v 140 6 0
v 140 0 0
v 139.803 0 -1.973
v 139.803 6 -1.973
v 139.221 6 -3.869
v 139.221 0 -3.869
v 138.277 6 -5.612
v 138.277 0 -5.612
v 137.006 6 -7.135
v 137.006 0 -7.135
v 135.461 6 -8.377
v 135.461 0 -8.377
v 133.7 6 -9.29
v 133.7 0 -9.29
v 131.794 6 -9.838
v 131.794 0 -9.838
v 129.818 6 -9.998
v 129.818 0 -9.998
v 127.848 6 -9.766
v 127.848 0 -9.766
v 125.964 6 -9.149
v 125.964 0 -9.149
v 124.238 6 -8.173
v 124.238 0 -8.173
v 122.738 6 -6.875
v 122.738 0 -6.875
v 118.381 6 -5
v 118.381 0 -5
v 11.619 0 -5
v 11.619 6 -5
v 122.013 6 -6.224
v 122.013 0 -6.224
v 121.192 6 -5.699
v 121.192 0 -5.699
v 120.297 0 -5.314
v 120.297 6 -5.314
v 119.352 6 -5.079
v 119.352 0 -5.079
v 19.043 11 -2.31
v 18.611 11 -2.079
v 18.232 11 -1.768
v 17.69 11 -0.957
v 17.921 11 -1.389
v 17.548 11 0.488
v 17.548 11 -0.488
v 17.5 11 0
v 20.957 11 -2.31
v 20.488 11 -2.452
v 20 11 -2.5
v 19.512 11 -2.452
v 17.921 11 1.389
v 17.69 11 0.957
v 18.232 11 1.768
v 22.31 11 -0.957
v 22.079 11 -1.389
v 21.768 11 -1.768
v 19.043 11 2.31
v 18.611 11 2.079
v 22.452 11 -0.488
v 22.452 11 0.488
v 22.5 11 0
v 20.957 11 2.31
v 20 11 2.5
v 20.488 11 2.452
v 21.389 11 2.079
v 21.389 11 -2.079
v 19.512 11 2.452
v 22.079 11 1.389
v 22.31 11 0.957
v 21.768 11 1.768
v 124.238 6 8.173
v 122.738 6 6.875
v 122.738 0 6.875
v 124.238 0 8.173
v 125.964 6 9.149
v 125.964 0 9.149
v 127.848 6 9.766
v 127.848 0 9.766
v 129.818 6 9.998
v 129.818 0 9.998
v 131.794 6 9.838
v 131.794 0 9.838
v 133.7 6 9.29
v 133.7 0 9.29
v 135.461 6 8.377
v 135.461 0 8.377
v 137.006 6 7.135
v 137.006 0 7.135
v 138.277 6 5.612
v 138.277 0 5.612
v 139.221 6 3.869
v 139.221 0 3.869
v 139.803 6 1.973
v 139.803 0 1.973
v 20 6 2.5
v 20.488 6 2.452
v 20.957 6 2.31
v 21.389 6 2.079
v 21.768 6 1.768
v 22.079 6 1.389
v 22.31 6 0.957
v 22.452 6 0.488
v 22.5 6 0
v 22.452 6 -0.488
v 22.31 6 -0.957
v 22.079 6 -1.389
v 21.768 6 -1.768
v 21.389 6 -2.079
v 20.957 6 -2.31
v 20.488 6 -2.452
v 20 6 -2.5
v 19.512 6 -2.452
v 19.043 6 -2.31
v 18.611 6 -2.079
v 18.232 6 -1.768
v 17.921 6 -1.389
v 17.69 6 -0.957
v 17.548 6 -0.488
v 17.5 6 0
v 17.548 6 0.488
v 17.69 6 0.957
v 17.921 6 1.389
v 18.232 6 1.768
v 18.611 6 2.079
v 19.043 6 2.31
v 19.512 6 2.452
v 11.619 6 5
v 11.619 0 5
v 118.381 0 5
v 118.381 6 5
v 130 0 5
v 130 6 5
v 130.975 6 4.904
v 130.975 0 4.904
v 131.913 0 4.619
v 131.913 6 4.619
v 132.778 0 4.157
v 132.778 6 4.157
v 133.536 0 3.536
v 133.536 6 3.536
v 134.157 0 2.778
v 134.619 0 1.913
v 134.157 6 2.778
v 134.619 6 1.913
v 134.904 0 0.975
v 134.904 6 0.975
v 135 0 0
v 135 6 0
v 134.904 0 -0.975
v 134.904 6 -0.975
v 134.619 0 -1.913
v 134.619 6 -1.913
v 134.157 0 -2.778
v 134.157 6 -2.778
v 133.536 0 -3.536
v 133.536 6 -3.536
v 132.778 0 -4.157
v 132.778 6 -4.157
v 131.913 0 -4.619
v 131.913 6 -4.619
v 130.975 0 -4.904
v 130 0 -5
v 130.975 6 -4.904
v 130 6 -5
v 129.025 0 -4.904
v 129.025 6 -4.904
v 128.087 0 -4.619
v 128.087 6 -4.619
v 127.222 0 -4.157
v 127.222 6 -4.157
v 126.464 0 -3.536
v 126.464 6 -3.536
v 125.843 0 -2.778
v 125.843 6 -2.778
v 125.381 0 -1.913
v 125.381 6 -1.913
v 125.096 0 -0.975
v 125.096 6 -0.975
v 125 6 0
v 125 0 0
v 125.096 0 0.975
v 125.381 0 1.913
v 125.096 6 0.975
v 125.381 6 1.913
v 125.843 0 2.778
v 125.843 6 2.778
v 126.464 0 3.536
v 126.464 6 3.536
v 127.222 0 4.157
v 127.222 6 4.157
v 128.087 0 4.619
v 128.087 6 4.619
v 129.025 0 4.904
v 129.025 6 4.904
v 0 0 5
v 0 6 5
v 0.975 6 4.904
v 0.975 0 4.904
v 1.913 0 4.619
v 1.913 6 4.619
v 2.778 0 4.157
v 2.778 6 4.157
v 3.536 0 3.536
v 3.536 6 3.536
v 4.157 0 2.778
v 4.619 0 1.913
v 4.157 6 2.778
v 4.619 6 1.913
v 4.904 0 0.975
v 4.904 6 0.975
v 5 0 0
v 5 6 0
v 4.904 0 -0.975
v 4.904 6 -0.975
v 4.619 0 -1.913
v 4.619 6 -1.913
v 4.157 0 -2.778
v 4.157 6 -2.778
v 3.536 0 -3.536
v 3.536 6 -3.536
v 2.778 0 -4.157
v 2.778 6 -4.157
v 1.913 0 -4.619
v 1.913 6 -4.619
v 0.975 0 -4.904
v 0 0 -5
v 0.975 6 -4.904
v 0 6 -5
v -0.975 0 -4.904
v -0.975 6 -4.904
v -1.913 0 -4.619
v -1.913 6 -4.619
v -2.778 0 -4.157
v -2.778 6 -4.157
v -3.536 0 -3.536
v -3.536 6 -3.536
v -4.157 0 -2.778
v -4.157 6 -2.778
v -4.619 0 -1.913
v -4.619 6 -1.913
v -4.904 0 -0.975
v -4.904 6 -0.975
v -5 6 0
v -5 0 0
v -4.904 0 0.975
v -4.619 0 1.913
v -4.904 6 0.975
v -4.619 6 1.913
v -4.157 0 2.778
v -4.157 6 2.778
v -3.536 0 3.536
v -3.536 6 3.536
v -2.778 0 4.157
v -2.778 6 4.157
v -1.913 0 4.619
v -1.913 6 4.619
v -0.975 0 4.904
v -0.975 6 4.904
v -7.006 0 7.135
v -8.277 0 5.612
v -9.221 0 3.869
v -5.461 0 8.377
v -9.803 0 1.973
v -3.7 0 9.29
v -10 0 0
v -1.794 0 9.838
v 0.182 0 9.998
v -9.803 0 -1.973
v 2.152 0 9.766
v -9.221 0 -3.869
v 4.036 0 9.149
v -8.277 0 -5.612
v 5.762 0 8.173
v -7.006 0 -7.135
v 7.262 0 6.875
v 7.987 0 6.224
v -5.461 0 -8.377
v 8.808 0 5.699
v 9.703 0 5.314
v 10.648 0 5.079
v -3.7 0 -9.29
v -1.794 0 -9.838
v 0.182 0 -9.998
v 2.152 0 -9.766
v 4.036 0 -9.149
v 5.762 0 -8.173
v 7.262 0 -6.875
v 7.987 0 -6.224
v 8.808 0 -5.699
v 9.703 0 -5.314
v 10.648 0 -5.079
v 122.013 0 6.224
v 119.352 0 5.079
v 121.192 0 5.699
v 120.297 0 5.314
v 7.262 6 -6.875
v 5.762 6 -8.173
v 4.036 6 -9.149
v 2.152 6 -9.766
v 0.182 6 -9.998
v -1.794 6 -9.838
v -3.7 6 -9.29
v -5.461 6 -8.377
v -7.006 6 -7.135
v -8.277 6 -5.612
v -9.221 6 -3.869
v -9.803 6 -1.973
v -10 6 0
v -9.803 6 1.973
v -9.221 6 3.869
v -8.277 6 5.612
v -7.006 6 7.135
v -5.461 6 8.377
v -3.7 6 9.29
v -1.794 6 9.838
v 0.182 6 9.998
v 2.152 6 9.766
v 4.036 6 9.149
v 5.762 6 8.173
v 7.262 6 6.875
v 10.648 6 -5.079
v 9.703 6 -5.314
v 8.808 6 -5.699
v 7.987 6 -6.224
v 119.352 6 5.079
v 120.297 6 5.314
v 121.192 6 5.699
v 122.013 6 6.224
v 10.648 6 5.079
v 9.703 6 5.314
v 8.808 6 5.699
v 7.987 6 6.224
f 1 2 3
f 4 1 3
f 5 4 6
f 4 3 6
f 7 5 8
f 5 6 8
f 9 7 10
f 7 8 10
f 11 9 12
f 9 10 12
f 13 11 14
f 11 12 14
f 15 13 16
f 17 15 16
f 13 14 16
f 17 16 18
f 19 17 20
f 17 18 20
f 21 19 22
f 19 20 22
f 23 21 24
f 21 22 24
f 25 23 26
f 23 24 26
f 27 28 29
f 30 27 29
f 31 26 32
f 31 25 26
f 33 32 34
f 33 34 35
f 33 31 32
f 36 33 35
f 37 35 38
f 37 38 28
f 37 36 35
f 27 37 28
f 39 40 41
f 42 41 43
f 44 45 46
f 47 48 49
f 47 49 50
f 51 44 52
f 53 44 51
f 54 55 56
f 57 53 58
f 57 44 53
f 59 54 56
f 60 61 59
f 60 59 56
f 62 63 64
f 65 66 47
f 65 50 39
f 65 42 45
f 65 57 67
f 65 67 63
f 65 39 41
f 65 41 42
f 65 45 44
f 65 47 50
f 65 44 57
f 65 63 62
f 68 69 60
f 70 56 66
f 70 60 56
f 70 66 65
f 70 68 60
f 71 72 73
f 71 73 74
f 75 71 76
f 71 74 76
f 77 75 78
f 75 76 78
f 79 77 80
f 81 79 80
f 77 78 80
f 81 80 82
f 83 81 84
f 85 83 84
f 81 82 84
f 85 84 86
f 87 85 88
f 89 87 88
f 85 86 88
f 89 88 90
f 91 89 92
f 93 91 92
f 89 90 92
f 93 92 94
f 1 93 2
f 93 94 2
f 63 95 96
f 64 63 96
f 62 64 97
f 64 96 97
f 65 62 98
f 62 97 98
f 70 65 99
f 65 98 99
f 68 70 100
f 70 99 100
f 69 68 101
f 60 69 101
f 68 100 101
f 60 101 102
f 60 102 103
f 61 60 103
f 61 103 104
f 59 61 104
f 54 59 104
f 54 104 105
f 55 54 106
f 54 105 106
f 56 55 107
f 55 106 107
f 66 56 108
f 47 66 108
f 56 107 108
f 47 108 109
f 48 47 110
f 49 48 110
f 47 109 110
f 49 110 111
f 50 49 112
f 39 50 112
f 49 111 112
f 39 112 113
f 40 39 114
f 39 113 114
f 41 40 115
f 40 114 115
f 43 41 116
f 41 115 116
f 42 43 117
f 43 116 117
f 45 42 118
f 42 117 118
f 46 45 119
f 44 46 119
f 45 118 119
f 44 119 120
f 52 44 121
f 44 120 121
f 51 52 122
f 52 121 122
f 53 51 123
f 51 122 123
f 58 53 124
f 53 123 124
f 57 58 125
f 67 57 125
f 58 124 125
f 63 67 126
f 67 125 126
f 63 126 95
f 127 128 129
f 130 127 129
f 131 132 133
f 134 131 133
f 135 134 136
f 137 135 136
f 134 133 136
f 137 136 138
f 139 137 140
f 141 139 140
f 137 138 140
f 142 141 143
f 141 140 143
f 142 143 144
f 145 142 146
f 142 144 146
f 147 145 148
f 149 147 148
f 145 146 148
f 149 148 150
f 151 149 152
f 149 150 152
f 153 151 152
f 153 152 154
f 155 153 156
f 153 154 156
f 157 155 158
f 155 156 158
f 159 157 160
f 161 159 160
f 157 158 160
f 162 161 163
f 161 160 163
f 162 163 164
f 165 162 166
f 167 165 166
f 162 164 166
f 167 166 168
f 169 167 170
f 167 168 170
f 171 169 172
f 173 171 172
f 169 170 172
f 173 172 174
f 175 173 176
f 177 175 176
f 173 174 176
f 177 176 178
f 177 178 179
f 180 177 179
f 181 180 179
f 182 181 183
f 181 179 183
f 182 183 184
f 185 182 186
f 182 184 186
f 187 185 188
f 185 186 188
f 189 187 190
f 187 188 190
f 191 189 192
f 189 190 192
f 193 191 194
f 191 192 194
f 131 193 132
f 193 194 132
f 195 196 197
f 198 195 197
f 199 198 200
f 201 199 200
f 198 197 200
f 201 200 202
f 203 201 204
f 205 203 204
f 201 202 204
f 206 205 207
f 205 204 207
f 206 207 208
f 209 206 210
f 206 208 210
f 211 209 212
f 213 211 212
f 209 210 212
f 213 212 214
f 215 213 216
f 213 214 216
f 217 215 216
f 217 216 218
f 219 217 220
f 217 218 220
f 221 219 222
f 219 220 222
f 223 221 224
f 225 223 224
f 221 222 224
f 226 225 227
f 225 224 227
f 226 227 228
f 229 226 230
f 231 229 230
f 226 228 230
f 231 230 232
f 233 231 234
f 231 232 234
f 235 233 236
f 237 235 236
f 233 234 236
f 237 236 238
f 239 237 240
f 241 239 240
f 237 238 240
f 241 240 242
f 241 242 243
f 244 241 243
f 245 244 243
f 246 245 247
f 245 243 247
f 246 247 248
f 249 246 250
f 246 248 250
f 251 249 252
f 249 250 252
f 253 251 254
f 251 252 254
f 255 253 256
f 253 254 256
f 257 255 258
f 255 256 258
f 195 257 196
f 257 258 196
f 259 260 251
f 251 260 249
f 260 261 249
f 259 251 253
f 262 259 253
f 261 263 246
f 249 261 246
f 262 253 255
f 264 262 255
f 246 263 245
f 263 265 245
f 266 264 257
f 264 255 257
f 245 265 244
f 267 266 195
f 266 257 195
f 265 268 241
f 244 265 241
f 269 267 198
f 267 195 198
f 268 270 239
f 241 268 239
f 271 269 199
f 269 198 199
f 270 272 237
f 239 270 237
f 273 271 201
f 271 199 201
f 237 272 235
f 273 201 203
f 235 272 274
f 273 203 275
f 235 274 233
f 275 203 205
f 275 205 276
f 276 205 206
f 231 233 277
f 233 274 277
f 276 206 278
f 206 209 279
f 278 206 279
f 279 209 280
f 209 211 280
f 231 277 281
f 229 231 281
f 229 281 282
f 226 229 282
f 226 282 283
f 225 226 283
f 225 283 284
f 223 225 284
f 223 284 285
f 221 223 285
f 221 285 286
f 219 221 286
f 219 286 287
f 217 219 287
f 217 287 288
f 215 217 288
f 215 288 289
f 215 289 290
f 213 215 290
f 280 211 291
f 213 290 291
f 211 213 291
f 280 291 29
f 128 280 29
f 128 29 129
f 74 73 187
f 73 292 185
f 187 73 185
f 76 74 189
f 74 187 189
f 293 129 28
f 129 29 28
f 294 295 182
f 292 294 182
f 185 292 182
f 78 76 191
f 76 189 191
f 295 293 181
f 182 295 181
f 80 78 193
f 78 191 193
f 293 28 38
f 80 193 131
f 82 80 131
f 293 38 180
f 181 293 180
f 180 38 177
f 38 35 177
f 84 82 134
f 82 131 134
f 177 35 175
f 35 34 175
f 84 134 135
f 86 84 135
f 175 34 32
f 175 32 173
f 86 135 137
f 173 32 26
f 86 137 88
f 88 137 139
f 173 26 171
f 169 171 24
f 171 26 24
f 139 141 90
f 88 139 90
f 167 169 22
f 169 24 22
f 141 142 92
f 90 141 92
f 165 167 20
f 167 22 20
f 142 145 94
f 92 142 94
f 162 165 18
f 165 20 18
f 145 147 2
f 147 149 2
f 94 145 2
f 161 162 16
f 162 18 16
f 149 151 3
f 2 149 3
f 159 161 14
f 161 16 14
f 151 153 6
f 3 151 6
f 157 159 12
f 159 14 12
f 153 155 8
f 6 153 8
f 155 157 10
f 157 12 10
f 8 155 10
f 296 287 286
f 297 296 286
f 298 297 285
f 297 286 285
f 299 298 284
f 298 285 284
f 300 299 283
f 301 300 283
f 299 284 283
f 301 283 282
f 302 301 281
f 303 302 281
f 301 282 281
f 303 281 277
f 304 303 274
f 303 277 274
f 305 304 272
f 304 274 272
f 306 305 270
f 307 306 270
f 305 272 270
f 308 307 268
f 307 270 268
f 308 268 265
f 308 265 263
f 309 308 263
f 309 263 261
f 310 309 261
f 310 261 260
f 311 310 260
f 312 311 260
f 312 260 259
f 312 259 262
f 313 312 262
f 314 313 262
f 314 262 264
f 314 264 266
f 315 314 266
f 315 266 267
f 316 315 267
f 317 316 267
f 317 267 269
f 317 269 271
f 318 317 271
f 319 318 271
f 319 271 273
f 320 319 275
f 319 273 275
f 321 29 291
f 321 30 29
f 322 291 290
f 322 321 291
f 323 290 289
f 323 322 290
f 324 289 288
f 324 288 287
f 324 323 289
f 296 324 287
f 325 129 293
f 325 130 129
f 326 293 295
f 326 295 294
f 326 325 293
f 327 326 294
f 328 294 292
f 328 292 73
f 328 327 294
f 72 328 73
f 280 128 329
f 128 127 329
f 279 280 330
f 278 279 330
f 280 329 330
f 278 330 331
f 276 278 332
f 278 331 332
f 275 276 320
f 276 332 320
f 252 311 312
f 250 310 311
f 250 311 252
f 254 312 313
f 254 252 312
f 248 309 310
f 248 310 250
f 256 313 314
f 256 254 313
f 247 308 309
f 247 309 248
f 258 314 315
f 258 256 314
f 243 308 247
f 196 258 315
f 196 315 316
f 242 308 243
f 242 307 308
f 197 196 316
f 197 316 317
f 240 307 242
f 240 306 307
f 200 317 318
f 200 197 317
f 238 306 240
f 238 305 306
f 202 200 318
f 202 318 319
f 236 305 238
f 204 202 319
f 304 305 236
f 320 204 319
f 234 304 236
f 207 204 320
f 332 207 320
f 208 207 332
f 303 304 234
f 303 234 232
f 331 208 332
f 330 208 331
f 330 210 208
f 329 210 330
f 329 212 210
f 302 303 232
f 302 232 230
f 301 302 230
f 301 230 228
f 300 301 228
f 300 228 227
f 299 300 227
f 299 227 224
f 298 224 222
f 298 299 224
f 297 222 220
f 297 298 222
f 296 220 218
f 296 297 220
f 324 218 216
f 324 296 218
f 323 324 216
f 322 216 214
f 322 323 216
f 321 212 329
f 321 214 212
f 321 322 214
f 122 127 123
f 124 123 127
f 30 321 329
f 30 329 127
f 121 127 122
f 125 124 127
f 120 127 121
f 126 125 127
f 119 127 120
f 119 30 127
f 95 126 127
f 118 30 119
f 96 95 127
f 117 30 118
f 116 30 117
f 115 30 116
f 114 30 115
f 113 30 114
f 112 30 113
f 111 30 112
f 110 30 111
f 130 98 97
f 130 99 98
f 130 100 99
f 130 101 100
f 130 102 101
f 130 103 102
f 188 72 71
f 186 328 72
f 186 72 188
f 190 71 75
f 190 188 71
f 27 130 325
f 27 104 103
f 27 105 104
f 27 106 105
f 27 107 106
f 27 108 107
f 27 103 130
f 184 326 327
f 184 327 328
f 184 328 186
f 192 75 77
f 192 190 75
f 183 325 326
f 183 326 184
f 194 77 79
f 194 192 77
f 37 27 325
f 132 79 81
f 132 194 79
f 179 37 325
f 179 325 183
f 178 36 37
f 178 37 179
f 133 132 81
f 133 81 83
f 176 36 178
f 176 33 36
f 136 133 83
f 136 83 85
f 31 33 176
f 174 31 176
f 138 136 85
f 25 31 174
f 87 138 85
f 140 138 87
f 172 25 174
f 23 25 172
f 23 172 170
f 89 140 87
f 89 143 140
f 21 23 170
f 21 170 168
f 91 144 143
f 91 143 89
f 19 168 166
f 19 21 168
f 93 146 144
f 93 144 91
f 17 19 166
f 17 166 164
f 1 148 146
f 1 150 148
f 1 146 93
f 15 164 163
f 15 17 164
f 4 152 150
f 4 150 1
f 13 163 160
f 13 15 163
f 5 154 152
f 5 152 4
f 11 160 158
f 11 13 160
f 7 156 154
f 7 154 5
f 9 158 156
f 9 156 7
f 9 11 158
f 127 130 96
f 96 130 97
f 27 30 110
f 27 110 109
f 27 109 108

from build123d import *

# Parameters (mm, degrees)
EXTRUDE_1_DEPTH     = 6
FILLET_1_R          = 6
SKETCH_2_R          = 5
CUT_EXTRUDE_1_DEPTH = 6
SKETCH_3_R          = 2.5
EXTRUDE_2_DEPTH     = 5


with BuildPart() as part:
    # 草图1 → 凸台-拉伸1 (new body)
    with BuildSketch(Plane(origin=(0, 0, 0), x_dir=(1, 0, 0), z_dir=(0, 1, 0))):
        with BuildLine():
            Line((0, 5), (0, 0))
            Line((0, 0), (0, -5))
            Line((0, -5), (8.660254038, -5))
            ThreePointArc((8.660254038, -5), (9.659258263, -2.588190451), (10, 0))
            ThreePointArc((10, 0), (9.659258263, 2.588190451), (8.660254038, 5))
            Line((8.660254038, 5), (0, 5))
        make_face()
        with BuildLine():
            Line((0, -5), (0, 0))
            Line((0, 0), (0, 5))
            Line((0, 5), (8.660254038, 5))
            ThreePointArc((8.660254038, 5), (-10, 0), (8.660254038, -5))
            Line((8.660254038, -5), (0, -5))
        make_face()
        with BuildLine():
            ThreePointArc((10, 0), (9.659258263, -2.588190451), (8.660254038, -5))
            Line((8.660254038, -5), (121.339745962, -5))
            ThreePointArc((121.339745962, -5), (120, 0), (121.339745962, 5))
            Line((121.339745962, 5), (8.660254038, 5))
            ThreePointArc((8.660254038, 5), (9.659258263, 2.588190451), (10, 0))
        make_face()
        with BuildLine():
            Line((0, 5), (0, 0))
            Line((0, 0), (0, -5))
            Line((0, -5), (8.660254038, -5))
            ThreePointArc((8.660254038, -5), (9.659258263, -2.588190451), (10, 0))
            ThreePointArc((10, 0), (9.659258263, 2.588190451), (8.660254038, 5))
            Line((8.660254038, 5), (0, 5))
        make_face()
        with BuildLine():
            Line((0, -5), (0, 0))
            Line((0, 0), (0, 5))
            Line((0, 5), (8.660254038, 5))
            ThreePointArc((8.660254038, 5), (-10, 0), (8.660254038, -5))
            Line((8.660254038, -5), (0, -5))
        make_face()
        with BuildLine():
            ThreePointArc((121.339745962, 5), (120, 0), (121.339745962, -5))
            Line((121.339745962, -5), (130, -5))
            Line((130, -5), (130, 5))
            Line((130, 5), (121.339745962, 5))
        make_face()
        with BuildLine():
            Line((130, -5), (121.339745962, -5))
            ThreePointArc((121.339745962, -5), (132.588190451, -9.659258263), (140, 0))
            ThreePointArc((140, 0), (132.588190451, 9.659258263), (121.339745962, 5))
            Line((121.339745962, 5), (130, 5))
            Line((130, 5), (130, -5))
        make_face()
        with BuildLine():
            ThreePointArc((121.339745962, 5), (120, 0), (121.339745962, -5))
            Line((121.339745962, -5), (130, -5))
            Line((130, -5), (130, 5))
            Line((130, 5), (121.339745962, 5))
        make_face()
        with BuildLine():
            Line((130, -5), (121.339745962, -5))
            ThreePointArc((121.339745962, -5), (132.588190451, -9.659258263), (140, 0))
            ThreePointArc((140, 0), (132.588190451, 9.659258263), (121.339745962, 5))
            Line((121.339745962, 5), (130, 5))
            Line((130, 5), (130, -5))
        make_face()
    extrude(amount=EXTRUDE_1_DEPTH)

    # 圆角1
    fillet_1_edges = [part.edges().sort_by_distance(p)[0] for p in [
        (8.660254038, 3, -5),
        (121.339745962, 3, -5),
        (121.339745962, 3, 5),
        (8.660254038, 3, 5),
    ]]
    fillet(fillet_1_edges, radius=FILLET_1_R)

    # 草图2 → 切除-拉伸1 (cut)
    with BuildSketch(Plane(origin=(0, 6, 0), x_dir=(1, 0, 0), z_dir=(0, 1, 0))):
        with Locations(Location((0, 0, 0), (0, 0, 270))):
            Circle(SKETCH_2_R)
        with Locations(Location((130, 0, 0), (0, 0, 270))):
            Circle(SKETCH_2_R)
    extrude(amount=-CUT_EXTRUDE_1_DEPTH, mode=Mode.SUBTRACT)

    # 草图3 → 凸台-拉伸2 (add)
    with BuildSketch(Plane(origin=(0, 6, 0), x_dir=(1, 0, 0), z_dir=(0, 1, 0))):
        with Locations(Location((20, 0, 0), (0, 0, 270))):
            Circle(SKETCH_3_R)
    extrude(amount=EXTRUDE_2_DEPTH)


solid = part.part
